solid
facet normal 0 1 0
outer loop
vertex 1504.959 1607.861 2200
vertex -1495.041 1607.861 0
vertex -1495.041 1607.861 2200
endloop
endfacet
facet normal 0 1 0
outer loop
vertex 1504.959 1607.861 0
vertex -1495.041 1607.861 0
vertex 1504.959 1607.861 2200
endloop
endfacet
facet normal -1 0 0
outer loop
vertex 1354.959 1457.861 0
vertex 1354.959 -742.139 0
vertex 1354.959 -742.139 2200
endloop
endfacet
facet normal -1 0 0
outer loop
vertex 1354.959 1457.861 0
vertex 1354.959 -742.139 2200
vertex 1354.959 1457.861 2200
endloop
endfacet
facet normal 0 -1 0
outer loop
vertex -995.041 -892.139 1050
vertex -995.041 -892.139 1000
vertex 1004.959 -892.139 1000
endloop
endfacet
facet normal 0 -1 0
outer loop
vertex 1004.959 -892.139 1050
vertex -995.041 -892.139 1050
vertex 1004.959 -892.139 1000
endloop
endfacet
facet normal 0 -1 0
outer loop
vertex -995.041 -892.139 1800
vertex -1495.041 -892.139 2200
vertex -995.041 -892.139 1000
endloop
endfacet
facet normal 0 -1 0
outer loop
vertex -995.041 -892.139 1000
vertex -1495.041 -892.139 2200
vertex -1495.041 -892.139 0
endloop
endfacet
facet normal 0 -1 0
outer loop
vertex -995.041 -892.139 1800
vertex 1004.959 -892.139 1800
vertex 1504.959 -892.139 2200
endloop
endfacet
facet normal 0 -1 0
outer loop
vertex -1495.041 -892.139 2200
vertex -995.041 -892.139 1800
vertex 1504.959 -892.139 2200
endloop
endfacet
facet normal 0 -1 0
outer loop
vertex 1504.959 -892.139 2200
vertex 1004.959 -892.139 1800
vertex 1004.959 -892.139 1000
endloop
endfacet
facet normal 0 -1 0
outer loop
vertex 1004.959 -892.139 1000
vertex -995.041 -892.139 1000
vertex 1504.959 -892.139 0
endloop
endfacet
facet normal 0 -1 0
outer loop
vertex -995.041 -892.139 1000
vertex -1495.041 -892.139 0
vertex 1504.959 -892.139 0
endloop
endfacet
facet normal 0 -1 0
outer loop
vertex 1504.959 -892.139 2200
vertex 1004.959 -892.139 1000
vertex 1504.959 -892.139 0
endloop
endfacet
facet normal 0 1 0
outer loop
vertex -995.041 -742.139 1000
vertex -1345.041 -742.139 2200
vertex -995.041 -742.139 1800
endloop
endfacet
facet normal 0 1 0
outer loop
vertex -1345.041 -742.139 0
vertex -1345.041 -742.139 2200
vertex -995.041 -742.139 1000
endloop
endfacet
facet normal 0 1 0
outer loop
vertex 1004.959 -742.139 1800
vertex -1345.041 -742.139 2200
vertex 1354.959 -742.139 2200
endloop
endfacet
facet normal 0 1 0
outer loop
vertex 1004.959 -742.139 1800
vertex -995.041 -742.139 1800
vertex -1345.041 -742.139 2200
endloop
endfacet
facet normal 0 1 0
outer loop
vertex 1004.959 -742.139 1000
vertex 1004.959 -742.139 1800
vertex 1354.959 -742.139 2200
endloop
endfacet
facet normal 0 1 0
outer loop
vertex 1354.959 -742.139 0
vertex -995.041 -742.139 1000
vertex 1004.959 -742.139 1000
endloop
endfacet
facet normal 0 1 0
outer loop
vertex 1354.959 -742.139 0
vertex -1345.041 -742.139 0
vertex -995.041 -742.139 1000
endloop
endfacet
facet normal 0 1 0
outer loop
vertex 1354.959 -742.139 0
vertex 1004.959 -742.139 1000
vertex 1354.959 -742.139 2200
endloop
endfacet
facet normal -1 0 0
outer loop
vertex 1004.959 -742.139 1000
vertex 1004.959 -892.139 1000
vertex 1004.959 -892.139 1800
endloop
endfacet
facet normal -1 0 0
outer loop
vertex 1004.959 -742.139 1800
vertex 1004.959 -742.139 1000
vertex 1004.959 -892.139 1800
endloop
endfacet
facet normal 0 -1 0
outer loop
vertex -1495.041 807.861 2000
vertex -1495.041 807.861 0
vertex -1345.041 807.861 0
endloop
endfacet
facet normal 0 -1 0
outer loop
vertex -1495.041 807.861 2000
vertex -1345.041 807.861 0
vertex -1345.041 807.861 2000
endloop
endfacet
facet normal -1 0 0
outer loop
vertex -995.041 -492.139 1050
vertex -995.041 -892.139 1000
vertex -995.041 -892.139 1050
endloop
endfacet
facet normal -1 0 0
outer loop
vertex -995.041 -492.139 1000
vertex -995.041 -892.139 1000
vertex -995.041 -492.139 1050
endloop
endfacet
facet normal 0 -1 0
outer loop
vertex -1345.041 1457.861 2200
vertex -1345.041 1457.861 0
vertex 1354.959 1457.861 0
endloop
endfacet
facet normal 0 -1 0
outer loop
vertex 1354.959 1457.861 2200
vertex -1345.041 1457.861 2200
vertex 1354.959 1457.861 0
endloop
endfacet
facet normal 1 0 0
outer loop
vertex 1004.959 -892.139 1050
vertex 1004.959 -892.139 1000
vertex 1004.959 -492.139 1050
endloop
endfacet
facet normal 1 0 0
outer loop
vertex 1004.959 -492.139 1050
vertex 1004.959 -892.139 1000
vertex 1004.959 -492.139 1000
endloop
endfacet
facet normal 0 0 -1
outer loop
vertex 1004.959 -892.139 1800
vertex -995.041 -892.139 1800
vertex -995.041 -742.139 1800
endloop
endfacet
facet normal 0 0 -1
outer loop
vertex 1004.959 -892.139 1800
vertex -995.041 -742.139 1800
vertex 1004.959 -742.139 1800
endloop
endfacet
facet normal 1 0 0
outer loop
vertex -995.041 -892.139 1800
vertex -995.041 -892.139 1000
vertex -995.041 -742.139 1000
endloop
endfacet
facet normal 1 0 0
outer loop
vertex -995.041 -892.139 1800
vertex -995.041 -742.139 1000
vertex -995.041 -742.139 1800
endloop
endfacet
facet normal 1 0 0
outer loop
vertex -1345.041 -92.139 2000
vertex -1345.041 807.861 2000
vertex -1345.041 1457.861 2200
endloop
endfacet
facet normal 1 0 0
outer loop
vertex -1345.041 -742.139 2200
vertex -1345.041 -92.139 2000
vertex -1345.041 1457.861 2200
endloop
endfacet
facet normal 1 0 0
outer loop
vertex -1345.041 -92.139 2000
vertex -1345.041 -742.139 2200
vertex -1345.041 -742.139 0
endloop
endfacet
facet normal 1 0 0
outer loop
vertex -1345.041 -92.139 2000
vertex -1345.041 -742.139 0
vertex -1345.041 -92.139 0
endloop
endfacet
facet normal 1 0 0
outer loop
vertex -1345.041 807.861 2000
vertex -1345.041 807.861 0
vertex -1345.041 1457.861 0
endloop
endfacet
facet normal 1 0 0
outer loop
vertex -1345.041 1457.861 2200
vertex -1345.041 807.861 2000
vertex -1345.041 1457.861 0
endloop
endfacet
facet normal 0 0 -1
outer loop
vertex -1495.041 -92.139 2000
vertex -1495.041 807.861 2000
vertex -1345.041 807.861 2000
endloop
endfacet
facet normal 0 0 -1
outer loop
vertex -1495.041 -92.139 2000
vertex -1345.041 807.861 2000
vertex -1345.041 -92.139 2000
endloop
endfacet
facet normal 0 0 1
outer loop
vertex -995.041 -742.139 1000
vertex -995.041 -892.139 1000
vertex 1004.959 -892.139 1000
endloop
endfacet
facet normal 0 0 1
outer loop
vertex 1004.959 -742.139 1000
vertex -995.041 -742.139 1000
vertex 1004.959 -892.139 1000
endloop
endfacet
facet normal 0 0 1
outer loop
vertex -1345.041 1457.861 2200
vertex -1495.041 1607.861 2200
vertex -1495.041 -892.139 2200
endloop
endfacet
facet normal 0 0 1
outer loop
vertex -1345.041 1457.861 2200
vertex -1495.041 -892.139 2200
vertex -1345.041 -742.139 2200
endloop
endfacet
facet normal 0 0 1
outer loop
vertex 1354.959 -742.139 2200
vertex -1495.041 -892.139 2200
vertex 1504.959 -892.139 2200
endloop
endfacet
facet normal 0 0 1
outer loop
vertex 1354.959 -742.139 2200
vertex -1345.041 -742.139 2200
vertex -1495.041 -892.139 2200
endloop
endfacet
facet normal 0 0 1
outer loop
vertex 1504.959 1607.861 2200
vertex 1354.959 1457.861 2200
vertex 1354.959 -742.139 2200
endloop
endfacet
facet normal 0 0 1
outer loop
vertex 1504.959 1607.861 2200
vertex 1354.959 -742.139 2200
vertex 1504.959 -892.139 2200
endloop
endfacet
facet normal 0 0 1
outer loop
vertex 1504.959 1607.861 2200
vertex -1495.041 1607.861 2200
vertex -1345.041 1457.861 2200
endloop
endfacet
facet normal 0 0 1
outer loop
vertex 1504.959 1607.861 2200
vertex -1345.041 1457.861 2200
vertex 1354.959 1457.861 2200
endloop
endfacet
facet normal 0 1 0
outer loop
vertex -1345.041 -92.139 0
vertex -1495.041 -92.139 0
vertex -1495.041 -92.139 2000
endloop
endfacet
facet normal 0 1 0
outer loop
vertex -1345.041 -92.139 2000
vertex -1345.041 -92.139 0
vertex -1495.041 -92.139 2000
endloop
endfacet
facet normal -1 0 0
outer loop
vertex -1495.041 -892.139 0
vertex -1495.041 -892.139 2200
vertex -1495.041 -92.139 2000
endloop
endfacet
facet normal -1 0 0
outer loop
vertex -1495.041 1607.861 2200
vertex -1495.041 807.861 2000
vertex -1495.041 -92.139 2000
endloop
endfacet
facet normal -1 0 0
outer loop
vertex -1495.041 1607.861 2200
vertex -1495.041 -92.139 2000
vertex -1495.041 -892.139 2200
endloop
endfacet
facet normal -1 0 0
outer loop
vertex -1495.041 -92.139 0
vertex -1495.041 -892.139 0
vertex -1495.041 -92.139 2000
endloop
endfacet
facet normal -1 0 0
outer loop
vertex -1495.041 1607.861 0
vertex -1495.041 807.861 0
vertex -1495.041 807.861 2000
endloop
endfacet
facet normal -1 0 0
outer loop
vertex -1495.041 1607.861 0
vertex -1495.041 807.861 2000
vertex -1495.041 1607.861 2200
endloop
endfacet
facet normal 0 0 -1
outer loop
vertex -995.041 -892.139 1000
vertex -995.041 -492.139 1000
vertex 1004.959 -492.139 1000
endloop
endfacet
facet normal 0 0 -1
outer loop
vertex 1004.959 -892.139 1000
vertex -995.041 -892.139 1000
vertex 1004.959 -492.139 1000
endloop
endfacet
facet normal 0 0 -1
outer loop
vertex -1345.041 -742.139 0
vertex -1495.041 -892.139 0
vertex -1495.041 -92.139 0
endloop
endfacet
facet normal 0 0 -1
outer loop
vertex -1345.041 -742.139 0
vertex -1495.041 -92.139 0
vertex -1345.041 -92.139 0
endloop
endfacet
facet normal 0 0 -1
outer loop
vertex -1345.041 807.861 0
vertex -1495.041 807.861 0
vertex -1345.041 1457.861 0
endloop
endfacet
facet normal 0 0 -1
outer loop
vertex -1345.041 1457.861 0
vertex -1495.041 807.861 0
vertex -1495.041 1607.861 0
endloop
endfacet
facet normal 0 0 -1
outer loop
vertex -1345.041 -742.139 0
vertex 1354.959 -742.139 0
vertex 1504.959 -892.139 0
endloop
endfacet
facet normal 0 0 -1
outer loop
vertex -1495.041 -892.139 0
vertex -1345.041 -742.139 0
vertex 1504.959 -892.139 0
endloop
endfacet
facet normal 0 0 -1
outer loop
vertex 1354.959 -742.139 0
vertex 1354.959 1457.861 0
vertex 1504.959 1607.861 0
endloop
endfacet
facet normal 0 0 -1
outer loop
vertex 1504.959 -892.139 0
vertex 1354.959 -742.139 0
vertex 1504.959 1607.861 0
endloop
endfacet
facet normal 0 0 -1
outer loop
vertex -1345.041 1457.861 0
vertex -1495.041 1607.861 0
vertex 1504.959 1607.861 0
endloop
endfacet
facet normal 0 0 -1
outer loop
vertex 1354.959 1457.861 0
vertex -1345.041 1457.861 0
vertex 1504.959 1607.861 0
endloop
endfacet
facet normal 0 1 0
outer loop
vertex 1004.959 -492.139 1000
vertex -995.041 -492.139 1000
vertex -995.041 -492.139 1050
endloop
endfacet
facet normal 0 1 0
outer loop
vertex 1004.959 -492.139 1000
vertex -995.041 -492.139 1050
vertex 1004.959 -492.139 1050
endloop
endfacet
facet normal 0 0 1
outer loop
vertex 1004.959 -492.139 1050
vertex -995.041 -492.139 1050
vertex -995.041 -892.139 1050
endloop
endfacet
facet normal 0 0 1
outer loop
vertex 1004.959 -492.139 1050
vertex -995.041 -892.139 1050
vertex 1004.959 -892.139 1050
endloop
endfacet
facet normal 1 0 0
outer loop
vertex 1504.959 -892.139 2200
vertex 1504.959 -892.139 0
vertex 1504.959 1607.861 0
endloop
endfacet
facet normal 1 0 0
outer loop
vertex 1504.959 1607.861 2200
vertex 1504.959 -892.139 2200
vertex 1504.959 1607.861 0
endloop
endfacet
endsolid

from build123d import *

# Parameters (mm, degrees)
F0_W     = 3000
F0_H     = 2500
F0_W_2   = 2700
F0_H_2   = 2200
F1_DEPTH = 2200
F2_DEPTH = 2200
F3_W     = 2000
F3_H     = 800
F4_DEPTH = 300
F5_W     = 900
F5_H     = 2000
F6_DEPTH = 300
F7_W     = 2000
F7_H     = 400
F8_DEPTH = 50


with BuildPart() as f1:
    # F0 (on Top) → F1 (new body)
    with BuildSketch(Plane.XY):
        with Locations((4.959445, 357.861314)):
            Rectangle(F0_W, F0_H)
        with Locations((4.959445, 357.861314)):
            Rectangle(F0_W_2, F0_H_2, mode=Mode.SUBTRACT)
    extrude(amount=F1_DEPTH)

    # F0 (on Top) → F2 (join)
    with BuildSketch(Plane.XY):
        with Locations((4.959445, 357.861314)):
            Rectangle(F0_W, F0_H)
        with Locations((4.959445, 357.861314)):
            Rectangle(F0_W_2, F0_H_2, mode=Mode.SUBTRACT)
    extrude(amount=F2_DEPTH)

    # F3 (on face) → F4 (cut)
    with BuildSketch(Plane.XZ.offset(892.138686)):
        with Locations((4.959445, 1400)):
            Rectangle(F3_W, F3_H)
    extrude(amount=-F4_DEPTH, mode=Mode.SUBTRACT)

    # F5 (on face) → F6 (cut)
    with BuildSketch(Plane(origin=(-1495.040555, 0, 0), x_dir=(0, -1, 0), z_dir=(-1, 0, 0))):
        with Locations((-357.861314, 1000)):
            Rectangle(F5_W, F5_H)
    extrude(amount=-F6_DEPTH, mode=Mode.SUBTRACT)


with BuildPart() as f8:
    # F7 (on face) → F8 (new body)
    with BuildSketch(Plane.XY.offset(1000)):
        with Locations((4.959445, -692.138686)):
            Rectangle(F7_W, F7_H)
    extrude(amount=F8_DEPTH)


solid = Compound([f1.part, f8.part])
